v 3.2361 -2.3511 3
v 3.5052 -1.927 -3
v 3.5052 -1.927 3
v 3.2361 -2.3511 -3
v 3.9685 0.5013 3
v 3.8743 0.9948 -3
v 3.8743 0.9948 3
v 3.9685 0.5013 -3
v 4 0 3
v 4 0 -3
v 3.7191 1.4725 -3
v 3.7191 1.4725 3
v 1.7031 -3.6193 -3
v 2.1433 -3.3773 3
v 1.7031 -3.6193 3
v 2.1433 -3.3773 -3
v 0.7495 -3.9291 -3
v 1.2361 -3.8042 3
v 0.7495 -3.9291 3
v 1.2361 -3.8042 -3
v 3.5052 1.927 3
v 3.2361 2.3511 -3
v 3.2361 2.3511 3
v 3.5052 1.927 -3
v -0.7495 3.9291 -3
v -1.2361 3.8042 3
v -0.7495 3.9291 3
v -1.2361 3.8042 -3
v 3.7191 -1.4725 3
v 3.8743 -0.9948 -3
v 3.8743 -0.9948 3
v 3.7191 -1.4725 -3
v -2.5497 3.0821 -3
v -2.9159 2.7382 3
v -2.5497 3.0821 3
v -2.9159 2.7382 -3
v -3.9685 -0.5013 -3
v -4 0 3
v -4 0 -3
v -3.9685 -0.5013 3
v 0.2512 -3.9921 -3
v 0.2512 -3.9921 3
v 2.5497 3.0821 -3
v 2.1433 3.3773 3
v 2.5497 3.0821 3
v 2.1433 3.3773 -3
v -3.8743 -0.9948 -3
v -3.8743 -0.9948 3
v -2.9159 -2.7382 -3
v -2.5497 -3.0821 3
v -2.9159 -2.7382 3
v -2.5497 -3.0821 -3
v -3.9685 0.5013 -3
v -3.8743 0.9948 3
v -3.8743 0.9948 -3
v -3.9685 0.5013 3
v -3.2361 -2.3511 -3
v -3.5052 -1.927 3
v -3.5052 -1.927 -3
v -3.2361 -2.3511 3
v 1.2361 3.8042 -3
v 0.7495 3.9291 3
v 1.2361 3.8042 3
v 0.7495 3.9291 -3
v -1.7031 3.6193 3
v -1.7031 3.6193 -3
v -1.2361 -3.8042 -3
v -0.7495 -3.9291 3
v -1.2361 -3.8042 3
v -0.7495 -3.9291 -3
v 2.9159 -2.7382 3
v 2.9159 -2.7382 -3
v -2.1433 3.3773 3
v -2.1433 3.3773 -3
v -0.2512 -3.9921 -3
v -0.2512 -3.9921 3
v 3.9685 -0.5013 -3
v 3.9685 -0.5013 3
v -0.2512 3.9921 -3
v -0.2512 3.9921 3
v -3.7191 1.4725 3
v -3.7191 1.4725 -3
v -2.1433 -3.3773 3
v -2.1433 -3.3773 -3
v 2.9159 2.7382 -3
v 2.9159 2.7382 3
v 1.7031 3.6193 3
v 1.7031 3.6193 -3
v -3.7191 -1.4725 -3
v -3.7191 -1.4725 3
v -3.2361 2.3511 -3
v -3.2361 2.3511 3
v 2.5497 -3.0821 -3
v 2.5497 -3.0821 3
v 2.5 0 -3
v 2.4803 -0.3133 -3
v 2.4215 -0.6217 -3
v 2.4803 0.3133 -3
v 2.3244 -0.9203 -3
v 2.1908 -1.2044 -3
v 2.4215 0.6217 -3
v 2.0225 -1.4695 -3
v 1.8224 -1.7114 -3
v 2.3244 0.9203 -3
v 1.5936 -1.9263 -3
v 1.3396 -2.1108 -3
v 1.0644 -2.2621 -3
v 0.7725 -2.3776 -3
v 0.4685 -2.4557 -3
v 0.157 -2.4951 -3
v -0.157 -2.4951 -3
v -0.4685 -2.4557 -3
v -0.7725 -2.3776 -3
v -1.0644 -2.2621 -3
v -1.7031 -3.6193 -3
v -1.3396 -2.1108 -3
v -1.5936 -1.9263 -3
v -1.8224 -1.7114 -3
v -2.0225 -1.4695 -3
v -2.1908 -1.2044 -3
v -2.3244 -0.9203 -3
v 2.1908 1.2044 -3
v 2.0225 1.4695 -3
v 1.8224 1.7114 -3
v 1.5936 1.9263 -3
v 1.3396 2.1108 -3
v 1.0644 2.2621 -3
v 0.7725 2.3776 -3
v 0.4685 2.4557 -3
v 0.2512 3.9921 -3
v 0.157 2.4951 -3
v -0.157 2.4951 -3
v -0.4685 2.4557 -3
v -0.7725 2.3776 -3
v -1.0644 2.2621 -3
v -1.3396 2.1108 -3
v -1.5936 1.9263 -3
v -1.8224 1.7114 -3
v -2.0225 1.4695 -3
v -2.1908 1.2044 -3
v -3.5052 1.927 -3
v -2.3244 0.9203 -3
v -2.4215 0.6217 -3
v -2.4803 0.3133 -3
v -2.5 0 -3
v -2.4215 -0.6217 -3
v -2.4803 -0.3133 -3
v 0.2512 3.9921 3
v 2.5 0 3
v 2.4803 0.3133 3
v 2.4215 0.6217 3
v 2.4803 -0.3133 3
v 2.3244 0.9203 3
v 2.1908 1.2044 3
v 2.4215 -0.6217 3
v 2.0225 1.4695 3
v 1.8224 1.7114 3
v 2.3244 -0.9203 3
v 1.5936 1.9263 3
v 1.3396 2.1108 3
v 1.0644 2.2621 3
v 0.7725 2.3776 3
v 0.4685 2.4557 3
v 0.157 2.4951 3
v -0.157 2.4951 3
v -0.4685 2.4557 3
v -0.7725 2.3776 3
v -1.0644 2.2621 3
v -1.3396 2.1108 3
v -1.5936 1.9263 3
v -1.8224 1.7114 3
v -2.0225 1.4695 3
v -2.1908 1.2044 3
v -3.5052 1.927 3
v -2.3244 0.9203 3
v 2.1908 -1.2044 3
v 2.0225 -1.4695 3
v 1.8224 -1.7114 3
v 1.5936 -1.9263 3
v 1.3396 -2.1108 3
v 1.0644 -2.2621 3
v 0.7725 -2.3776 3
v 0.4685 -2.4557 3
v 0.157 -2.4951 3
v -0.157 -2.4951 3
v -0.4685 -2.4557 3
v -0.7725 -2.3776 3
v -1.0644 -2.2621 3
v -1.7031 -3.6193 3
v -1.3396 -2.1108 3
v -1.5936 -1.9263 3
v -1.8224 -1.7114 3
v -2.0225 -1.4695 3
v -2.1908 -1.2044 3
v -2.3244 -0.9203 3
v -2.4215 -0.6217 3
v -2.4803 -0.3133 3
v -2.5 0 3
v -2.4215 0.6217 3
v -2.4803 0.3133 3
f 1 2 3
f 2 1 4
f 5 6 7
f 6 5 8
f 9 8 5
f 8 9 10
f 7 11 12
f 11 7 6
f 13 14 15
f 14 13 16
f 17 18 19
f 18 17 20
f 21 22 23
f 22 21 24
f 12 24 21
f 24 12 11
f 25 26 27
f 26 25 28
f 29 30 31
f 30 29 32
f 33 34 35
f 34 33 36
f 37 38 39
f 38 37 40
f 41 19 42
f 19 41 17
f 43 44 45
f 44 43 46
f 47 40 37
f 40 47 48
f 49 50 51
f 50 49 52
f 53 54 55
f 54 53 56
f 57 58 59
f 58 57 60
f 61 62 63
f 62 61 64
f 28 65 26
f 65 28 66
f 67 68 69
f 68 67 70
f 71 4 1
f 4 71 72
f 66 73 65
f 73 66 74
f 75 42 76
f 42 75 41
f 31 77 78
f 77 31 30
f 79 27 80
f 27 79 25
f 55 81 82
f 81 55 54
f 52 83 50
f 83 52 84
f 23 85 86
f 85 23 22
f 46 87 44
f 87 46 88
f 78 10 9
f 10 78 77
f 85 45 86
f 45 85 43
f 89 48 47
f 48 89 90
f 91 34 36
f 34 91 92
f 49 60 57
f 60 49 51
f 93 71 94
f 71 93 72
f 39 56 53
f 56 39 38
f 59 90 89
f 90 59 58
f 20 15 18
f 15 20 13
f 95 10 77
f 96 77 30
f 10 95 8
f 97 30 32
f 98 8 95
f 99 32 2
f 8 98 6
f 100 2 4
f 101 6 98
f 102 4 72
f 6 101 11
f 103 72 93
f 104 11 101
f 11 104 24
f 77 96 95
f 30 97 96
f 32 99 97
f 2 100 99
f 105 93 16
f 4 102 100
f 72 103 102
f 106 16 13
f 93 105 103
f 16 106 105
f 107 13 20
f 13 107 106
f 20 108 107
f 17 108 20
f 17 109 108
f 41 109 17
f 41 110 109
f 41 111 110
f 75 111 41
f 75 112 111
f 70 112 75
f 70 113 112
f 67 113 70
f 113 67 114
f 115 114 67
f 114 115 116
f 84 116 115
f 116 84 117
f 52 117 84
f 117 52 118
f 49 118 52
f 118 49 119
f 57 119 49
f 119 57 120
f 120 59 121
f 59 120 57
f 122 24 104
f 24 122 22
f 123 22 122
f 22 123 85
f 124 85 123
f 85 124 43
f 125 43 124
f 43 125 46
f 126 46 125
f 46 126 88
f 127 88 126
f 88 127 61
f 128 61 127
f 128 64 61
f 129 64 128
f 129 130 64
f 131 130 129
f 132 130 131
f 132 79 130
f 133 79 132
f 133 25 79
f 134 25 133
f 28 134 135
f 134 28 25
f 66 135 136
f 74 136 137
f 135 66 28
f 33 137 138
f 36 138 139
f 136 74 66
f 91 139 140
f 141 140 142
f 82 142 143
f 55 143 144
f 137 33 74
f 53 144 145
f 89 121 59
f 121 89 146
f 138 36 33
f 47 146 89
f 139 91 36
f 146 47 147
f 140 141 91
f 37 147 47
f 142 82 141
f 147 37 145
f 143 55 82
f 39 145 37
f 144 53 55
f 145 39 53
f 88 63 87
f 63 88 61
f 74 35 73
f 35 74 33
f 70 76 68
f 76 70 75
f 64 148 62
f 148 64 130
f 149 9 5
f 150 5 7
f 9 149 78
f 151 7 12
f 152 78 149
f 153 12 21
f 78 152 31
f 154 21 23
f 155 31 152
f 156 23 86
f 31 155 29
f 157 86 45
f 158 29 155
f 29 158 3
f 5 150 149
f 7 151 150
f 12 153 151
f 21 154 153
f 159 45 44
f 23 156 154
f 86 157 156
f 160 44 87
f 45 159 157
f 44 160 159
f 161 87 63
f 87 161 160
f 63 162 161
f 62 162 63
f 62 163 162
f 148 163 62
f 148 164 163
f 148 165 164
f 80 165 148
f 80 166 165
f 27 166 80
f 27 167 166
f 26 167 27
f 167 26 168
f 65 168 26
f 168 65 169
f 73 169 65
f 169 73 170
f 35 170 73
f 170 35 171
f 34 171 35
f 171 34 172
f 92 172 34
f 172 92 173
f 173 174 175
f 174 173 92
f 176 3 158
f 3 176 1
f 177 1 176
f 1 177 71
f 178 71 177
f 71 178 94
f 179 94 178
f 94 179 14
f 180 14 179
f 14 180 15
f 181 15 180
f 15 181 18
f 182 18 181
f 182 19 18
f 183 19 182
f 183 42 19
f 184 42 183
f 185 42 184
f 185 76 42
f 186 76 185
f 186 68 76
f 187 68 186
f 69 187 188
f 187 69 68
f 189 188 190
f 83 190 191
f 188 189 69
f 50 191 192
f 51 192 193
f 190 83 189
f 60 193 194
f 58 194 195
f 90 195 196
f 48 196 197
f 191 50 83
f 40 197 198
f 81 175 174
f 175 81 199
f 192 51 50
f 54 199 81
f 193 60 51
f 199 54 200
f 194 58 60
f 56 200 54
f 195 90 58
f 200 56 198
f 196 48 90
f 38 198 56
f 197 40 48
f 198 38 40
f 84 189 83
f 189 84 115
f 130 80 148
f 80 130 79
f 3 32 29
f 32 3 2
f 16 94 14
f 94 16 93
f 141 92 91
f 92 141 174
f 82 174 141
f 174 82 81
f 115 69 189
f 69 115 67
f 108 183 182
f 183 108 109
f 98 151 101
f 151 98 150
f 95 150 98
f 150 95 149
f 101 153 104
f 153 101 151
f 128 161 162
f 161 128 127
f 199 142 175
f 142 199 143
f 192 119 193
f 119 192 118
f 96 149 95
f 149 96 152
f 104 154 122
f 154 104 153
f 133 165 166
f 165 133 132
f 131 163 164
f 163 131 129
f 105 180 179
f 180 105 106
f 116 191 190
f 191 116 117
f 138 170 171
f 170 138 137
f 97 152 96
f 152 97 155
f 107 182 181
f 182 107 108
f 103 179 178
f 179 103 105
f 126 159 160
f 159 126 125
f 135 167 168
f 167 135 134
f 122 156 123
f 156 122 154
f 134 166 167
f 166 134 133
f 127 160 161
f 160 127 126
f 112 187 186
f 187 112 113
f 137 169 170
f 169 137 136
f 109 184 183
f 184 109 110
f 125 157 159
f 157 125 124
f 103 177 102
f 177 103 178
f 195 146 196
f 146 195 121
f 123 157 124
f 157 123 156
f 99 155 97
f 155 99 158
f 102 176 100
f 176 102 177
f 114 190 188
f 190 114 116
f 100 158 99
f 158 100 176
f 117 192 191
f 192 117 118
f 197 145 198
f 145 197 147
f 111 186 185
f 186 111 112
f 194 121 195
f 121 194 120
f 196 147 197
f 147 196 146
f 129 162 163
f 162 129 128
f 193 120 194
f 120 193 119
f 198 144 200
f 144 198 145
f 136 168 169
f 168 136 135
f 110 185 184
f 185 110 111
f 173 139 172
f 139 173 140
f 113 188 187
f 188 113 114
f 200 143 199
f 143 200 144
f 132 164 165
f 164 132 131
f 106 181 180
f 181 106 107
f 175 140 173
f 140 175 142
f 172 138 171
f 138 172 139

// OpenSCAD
$fn = 50;


difference() {
	union() {
		translate(v = [0, 0, -3.0000000000]) {
			cylinder(h = 6, r = 4.0000000000);
		}
	}
	union() {
		translate(v = [0, 0, -100.0000000000]) {
			cylinder(h = 200, r = 2.5000000000);
		}
	}
}
